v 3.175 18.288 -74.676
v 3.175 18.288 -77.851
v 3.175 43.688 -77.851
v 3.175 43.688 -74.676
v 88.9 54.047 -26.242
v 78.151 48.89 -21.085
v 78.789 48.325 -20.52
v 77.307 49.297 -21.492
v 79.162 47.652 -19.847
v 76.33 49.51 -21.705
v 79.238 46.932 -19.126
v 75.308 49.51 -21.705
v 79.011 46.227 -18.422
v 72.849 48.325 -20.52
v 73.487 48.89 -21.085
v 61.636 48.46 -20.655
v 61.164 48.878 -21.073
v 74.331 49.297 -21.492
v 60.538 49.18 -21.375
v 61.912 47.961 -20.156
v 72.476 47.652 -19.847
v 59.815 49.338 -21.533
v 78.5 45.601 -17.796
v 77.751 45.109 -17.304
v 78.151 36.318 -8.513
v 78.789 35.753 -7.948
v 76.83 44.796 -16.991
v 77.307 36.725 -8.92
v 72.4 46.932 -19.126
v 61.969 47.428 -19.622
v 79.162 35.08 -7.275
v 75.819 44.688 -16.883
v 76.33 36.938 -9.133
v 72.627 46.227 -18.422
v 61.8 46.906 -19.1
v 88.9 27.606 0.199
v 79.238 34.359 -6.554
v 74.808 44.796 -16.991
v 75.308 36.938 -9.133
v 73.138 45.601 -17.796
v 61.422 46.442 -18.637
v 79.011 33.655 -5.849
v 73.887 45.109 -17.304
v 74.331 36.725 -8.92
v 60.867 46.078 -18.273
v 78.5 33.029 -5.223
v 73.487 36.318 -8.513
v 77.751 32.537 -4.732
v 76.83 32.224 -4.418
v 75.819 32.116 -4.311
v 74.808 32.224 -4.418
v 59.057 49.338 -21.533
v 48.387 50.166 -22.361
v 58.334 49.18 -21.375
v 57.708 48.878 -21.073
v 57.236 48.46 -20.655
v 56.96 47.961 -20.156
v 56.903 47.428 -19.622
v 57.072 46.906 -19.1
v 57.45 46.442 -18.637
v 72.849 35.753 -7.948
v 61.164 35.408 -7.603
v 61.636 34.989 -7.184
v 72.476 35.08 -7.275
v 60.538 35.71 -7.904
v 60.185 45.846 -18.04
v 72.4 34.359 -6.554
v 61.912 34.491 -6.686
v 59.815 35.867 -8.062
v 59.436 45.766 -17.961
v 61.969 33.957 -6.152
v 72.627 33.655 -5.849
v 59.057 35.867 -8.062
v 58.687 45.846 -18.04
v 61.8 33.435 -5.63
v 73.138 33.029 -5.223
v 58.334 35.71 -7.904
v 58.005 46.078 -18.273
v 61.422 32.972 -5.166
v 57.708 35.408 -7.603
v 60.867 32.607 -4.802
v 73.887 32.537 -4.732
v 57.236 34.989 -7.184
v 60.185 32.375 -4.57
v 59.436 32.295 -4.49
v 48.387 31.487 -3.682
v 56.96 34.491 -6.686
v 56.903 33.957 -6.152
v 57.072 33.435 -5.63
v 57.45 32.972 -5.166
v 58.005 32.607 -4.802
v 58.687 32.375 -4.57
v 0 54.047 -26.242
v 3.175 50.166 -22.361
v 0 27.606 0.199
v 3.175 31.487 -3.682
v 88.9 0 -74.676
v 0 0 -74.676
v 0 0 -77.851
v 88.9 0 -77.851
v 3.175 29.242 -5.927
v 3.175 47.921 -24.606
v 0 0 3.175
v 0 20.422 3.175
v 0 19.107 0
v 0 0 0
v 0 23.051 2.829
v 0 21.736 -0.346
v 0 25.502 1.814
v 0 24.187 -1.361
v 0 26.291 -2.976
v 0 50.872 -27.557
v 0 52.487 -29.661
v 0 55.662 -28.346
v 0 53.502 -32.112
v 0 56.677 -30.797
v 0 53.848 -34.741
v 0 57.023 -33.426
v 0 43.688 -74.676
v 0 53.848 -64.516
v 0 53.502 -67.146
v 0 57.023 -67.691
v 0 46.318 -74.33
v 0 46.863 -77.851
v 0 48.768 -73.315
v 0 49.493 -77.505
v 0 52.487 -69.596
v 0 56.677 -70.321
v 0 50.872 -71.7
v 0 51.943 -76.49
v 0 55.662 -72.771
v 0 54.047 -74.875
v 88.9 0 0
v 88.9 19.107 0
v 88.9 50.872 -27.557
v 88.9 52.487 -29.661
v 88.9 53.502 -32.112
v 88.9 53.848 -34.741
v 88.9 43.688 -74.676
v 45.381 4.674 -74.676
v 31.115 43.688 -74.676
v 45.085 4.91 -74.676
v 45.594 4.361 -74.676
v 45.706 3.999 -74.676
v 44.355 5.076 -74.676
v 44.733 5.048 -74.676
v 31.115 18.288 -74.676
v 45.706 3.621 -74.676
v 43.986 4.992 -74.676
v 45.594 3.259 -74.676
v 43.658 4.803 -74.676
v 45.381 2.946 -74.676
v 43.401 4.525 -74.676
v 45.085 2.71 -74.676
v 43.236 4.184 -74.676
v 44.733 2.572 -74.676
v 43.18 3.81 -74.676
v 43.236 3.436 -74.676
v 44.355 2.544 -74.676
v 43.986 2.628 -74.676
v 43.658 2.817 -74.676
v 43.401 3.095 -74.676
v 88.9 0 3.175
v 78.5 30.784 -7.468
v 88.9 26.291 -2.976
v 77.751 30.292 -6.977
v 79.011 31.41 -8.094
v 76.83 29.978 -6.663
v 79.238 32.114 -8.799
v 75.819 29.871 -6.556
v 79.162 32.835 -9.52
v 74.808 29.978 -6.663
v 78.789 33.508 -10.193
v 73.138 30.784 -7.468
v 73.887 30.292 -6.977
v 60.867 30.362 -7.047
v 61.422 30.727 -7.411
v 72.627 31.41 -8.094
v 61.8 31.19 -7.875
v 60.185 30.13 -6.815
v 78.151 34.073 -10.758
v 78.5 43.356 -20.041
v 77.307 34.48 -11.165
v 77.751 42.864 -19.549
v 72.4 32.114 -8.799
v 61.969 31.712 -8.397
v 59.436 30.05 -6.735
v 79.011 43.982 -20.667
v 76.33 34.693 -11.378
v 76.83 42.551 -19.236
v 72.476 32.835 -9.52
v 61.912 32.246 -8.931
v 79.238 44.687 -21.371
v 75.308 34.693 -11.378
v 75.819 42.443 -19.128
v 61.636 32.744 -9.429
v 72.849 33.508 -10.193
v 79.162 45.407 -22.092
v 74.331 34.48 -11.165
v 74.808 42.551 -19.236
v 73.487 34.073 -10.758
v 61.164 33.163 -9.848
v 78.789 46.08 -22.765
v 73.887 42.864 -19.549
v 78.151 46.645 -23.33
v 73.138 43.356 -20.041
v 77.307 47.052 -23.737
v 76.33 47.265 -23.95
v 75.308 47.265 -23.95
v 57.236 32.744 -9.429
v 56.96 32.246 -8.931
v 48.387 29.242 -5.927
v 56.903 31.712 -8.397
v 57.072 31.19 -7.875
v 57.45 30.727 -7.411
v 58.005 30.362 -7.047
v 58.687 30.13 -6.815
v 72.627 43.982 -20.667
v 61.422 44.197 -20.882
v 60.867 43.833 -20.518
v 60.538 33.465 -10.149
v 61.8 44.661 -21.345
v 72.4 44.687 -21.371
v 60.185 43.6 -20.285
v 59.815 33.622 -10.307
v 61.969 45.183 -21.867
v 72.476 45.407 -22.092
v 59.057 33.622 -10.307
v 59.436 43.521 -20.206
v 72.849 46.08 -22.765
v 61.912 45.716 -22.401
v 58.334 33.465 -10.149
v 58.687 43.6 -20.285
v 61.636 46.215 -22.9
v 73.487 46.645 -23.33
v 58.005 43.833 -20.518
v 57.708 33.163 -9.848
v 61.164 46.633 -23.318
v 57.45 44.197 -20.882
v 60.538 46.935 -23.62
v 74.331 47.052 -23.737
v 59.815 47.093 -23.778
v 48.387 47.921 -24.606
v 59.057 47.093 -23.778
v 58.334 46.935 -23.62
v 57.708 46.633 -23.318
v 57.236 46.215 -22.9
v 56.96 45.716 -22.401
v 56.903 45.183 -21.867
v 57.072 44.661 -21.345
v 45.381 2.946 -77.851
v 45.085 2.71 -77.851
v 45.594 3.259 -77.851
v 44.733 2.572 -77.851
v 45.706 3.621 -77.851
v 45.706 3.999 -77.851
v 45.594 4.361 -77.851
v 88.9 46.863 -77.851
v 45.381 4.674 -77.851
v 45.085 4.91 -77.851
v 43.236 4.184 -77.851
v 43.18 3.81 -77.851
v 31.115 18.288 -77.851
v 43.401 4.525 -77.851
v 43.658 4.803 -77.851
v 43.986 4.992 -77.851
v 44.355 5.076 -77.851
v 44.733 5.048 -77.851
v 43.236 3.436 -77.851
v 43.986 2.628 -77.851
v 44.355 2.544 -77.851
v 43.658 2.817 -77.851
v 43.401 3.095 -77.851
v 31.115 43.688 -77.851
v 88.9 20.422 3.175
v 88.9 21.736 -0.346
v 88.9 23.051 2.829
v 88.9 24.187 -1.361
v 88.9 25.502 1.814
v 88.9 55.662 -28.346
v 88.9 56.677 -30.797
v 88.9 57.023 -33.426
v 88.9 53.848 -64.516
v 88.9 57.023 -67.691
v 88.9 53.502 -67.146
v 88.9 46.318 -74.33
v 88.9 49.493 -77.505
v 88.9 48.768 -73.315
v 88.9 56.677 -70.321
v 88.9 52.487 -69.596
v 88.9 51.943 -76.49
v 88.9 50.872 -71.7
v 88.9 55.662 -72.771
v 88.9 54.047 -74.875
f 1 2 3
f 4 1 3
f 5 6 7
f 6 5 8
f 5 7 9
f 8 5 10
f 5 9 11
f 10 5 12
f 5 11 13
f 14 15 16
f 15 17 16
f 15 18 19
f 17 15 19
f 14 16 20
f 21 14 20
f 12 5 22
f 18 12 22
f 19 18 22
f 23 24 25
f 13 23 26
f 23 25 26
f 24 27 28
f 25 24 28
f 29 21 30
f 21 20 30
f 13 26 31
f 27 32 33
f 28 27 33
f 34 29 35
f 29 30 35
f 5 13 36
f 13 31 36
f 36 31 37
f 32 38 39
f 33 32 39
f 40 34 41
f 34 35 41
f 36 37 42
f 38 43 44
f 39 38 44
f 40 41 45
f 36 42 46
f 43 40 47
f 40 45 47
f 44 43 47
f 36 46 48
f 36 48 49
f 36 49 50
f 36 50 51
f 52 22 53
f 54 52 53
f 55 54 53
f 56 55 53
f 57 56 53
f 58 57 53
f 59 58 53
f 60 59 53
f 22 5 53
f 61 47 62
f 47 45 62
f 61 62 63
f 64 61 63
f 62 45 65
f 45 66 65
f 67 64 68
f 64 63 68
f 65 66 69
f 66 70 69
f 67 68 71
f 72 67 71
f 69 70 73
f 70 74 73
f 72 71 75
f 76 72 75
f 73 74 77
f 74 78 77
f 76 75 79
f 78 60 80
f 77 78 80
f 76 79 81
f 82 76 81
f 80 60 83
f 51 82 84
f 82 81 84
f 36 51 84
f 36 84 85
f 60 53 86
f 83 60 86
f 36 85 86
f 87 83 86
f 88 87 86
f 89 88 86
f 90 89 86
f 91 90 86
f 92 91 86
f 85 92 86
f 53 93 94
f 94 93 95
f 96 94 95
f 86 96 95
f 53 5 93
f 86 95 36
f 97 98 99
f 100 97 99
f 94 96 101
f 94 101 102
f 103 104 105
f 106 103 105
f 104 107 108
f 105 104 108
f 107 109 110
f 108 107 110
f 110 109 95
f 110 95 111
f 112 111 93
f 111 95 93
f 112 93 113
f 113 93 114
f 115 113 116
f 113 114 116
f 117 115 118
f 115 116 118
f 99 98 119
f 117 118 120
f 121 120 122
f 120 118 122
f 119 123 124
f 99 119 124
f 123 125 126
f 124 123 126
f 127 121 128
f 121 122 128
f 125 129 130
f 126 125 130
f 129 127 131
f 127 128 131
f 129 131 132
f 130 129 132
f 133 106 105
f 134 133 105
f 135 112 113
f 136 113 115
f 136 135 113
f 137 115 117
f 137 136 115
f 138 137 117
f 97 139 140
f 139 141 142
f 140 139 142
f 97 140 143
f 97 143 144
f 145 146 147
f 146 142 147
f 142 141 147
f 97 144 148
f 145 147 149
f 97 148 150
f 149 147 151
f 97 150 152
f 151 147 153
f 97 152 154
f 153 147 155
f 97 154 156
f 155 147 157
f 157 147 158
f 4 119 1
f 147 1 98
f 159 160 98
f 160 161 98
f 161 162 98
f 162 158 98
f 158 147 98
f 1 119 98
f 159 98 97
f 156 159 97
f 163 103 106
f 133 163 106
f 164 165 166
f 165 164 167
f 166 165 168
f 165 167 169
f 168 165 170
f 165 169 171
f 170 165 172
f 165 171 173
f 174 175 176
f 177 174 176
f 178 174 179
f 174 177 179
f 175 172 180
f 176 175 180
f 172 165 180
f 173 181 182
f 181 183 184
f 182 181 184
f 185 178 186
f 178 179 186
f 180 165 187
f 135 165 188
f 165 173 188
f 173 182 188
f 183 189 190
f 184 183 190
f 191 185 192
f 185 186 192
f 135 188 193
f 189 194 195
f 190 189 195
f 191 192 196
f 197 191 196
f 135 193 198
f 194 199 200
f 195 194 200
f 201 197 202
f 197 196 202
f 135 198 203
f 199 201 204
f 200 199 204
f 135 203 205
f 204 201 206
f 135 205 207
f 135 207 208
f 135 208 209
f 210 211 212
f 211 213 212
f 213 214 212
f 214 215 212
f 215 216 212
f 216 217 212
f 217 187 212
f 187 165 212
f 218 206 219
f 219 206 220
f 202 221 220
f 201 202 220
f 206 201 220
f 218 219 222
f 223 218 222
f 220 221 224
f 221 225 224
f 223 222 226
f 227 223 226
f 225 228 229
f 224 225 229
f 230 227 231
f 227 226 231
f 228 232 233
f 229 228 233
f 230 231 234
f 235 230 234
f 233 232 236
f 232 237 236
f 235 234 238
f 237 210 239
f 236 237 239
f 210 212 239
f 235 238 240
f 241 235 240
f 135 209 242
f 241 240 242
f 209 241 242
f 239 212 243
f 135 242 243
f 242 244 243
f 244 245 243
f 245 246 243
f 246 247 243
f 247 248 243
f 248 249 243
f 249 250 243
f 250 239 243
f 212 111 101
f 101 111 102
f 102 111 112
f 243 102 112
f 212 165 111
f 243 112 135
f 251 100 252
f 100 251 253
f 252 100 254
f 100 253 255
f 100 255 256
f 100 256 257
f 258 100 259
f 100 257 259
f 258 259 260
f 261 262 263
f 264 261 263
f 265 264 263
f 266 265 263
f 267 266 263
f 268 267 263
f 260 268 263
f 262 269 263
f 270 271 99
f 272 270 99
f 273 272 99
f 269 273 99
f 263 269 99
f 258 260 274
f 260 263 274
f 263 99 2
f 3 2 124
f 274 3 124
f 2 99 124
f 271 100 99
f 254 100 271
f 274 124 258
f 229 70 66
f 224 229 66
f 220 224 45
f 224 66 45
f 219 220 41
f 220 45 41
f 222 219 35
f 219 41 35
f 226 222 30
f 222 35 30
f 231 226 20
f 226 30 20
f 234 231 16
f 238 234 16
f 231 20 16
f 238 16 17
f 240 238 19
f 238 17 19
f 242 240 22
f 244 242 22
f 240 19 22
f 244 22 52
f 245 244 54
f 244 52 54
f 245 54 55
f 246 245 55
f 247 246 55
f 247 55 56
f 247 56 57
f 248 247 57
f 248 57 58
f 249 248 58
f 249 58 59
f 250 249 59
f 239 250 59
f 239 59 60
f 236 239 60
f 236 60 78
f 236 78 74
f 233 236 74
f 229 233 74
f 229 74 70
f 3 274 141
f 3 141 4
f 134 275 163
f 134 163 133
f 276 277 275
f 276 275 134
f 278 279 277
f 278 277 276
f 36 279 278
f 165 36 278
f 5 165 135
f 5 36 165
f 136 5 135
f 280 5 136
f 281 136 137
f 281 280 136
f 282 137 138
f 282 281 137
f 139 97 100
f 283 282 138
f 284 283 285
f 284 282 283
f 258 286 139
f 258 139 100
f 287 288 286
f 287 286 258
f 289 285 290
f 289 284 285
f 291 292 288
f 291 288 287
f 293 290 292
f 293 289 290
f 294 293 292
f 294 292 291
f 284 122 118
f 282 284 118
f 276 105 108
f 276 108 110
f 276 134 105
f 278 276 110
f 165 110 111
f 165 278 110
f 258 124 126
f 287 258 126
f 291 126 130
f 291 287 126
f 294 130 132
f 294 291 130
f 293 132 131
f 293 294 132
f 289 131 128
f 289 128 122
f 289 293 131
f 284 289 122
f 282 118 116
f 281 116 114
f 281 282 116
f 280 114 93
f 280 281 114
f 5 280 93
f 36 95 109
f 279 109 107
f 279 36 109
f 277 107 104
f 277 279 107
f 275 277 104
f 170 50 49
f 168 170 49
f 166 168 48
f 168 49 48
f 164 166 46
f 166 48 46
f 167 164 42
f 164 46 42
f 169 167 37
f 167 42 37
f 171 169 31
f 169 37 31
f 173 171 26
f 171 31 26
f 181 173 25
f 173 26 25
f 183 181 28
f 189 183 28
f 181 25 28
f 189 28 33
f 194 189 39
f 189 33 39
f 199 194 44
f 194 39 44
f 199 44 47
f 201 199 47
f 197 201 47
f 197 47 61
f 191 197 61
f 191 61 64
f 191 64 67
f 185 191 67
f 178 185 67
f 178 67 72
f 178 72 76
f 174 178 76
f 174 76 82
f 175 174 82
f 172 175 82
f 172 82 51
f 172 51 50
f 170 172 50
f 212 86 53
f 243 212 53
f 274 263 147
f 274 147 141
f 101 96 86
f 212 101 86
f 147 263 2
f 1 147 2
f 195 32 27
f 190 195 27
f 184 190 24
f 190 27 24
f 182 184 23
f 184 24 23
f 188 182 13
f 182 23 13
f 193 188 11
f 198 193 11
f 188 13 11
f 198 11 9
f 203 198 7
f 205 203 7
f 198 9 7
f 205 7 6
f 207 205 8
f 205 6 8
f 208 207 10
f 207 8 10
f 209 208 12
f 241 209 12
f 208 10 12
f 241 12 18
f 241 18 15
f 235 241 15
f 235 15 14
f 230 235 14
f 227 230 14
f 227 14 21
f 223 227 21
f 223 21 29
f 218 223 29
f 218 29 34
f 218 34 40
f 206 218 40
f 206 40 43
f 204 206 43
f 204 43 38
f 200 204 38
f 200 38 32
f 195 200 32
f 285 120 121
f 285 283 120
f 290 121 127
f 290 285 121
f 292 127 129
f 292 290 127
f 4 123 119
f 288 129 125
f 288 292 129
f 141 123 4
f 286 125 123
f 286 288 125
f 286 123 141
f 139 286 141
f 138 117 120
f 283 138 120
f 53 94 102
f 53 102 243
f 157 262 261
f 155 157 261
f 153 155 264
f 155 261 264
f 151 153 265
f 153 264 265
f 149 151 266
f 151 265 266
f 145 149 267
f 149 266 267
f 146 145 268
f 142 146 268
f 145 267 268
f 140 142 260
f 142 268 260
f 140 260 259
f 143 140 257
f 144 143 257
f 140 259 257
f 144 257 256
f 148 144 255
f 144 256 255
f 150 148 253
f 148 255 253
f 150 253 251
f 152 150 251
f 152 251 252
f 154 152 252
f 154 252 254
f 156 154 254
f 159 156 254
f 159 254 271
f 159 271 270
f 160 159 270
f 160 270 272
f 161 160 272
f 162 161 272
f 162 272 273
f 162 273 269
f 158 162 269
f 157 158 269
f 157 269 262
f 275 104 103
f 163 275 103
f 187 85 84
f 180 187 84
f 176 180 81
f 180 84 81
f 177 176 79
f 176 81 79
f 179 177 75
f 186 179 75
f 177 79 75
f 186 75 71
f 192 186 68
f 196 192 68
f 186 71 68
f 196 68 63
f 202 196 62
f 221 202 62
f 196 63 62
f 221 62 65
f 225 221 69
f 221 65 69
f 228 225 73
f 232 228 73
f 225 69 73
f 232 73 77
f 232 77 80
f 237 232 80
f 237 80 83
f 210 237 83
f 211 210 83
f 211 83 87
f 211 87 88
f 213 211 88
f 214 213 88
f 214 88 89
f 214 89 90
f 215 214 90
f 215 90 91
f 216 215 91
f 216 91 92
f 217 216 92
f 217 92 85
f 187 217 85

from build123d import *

# Parameters (mm, degrees)
BOSS_EXTRUDE1_DEPTH = 88.9
FILLET1_R           = 10.16
CUT_EXTRUDE1_REACH  = 76.71
SKETCH2_R           = 3.429
SKETCH2_R_2         = 2.54
SKETCH2_W           = 45.212
SKETCH2_H           = 26.416
CUT_EXTRUDE3_REACH  = 83.026
SKETCH4_R           = 1.27
SKETCH4_W           = 27.94
SKETCH4_H           = 25.4


with BuildPart() as part:
    # Sketch1 → Boss-Extrude1 (new body)
    with BuildSketch(Plane(origin=(0, 0, 0), x_dir=(0, 0, -1), z_dir=(1, 0, 0))):
        Polygon((0, 0), (0, 23.315129188), (30.532870812, 53.848), (74.676, 53.848), (74.676, 0), (77.851, 0), (77.851, 57.023), (29.217742751, 57.023), (-3.175, 24.630257249), (-3.175, 0), align=None)
    extrude(amount=BOSS_EXTRUDE1_DEPTH)

    # Fillet1
    fillet1_edges = [part.edges().sort_by_distance(p)[0] for p in [
        (44.45, 24.630257249, 3.175),
        (44.45, 57.023, -29.217742751),
        (44.45, 57.023, -77.851),
        (44.45, 53.848, -74.676),
        (44.45, 53.848, -30.532870812),
        (44.45, 23.315129188, 0),
    ]]
    fillet(fillet1_edges, radius=FILLET1_R)

    # Sketch2 → Cut-Extrude1 (cut, up to next)
    with BuildSketch(Plane(origin=(0, 13.902628624, 13.902628624), x_dir=(1, 0, 0), z_dir=(0, 0.707106781, 0.707106781)), mode=Mode.PRIVATE) as cut_extrude1_sk1:
        with Locations(Location((75.819, 46.966285953, 0), (0, 0, 270))):  # turned: the seam where the file's is
            Circle(SKETCH2_R)
    cut_extrude1_tool1 = extrude(cut_extrude1_sk1.sketch, amount=-CUT_EXTRUDE1_REACH, mode=Mode.PRIVATE) & part.part
    add(cut_extrude1_tool1.solids().sort_by_distance((75.819, 47.112808, -19.307551))[0], mode=Mode.SUBTRACT)
    # Sketch2 → Cut-Extrude1 (cut, up to next)
    with BuildSketch(Plane(origin=(0, 13.902628624, 13.902628624), x_dir=(1, 0, 0), z_dir=(0, 0.707106781, 0.707106781)), mode=Mode.PRIVATE) as cut_extrude1_sk2:
        with Locations(Location((75.819, 29.186285953, 0), (0, 0, 270))):  # turned: the seam where the file's is
            Circle(SKETCH2_R)
    cut_extrude1_tool2 = extrude(cut_extrude1_sk2.sketch, amount=-CUT_EXTRUDE1_REACH, mode=Mode.PRIVATE) & part.part
    add(cut_extrude1_tool2.solids().sort_by_distance((75.819, 34.540449, -6.735192))[0], mode=Mode.SUBTRACT)
    # Sketch2 → Cut-Extrude1 (cut, up to next)
    with BuildSketch(Plane(origin=(0, 13.902628624, 13.902628624), x_dir=(1, 0, 0), z_dir=(0, 0.707106781, 0.707106781)), mode=Mode.PRIVATE) as cut_extrude1_sk3:
        with Locations(Location((59.436, 47.601285953, 0), (0, 0, 270))):  # turned: the seam where the file's is
            Circle(SKETCH2_R_2)
    cut_extrude1_tool3 = extrude(cut_extrude1_sk3.sketch, amount=-CUT_EXTRUDE1_REACH, mode=Mode.PRIVATE) & part.part
    add(cut_extrude1_tool3.solids().sort_by_distance((59.436, 47.561821, -19.756563))[0], mode=Mode.SUBTRACT)
    # Sketch2 → Cut-Extrude1 (cut, up to next)
    with BuildSketch(Plane(origin=(0, 13.902628624, 13.902628624), x_dir=(1, 0, 0), z_dir=(0, 0.707106781, 0.707106781)), mode=Mode.PRIVATE) as cut_extrude1_sk4:
        with Locations(Location((59.436, 28.551285953, 0), (0, 0, 270))):  # turned: the seam where the file's is
            Circle(SKETCH2_R_2)
    cut_extrude1_tool4 = extrude(cut_extrude1_sk4.sketch, amount=-CUT_EXTRUDE1_REACH, mode=Mode.PRIVATE) & part.part
    add(cut_extrude1_tool4.solids().sort_by_distance((59.436, 34.091437, -6.286179))[0], mode=Mode.SUBTRACT)
    # Sketch2 → Cut-Extrude1 (cut, up to next)
    with BuildSketch(Plane(origin=(0, 13.902628624, 13.902628624), x_dir=(1, 0, 0), z_dir=(0, 0.707106781, 0.707106781)), mode=Mode.PRIVATE) as cut_extrude1_sk5:
        with Locations((25.781, 38.076285953)):
            Rectangle(SKETCH2_W, SKETCH2_H)
    cut_extrude1_tool5 = extrude(cut_extrude1_sk5.sketch, amount=-CUT_EXTRUDE1_REACH, mode=Mode.PRIVATE) & part.part
    add(cut_extrude1_tool5.solids().sort_by_distance((25.781, 40.826629, -13.021371))[0], mode=Mode.SUBTRACT)

    # Sketch4 → Cut-Extrude3 (cut, up to next)
    with BuildSketch(Plane(origin=(0, 0, -77.851), x_dir=(-1, 0, 0), z_dir=(0, 0, -1)), mode=Mode.PRIVATE) as cut_extrude3_sk1:
        with Locations((-44.45, 3.81)):
            Circle(SKETCH4_R)
    cut_extrude3_tool1 = extrude(cut_extrude3_sk1.sketch, amount=-CUT_EXTRUDE3_REACH, mode=Mode.PRIVATE) & part.part
    add(cut_extrude3_tool1.solids().sort_by_distance((44.45, 3.81, -77.851))[0], mode=Mode.SUBTRACT)
    # Sketch4 → Cut-Extrude3 (cut, up to next)
    with BuildSketch(Plane(origin=(0, 0, -77.851), x_dir=(-1, 0, 0), z_dir=(0, 0, -1)), mode=Mode.PRIVATE) as cut_extrude3_sk2:
        with Locations((-17.145, 30.988)):
            Rectangle(SKETCH4_W, SKETCH4_H)
    cut_extrude3_tool2 = extrude(cut_extrude3_sk2.sketch, amount=-CUT_EXTRUDE3_REACH, mode=Mode.PRIVATE) & part.part
    add(cut_extrude3_tool2.solids().sort_by_distance((17.145, 30.988, -77.851))[0], mode=Mode.SUBTRACT)


solid = part.part
